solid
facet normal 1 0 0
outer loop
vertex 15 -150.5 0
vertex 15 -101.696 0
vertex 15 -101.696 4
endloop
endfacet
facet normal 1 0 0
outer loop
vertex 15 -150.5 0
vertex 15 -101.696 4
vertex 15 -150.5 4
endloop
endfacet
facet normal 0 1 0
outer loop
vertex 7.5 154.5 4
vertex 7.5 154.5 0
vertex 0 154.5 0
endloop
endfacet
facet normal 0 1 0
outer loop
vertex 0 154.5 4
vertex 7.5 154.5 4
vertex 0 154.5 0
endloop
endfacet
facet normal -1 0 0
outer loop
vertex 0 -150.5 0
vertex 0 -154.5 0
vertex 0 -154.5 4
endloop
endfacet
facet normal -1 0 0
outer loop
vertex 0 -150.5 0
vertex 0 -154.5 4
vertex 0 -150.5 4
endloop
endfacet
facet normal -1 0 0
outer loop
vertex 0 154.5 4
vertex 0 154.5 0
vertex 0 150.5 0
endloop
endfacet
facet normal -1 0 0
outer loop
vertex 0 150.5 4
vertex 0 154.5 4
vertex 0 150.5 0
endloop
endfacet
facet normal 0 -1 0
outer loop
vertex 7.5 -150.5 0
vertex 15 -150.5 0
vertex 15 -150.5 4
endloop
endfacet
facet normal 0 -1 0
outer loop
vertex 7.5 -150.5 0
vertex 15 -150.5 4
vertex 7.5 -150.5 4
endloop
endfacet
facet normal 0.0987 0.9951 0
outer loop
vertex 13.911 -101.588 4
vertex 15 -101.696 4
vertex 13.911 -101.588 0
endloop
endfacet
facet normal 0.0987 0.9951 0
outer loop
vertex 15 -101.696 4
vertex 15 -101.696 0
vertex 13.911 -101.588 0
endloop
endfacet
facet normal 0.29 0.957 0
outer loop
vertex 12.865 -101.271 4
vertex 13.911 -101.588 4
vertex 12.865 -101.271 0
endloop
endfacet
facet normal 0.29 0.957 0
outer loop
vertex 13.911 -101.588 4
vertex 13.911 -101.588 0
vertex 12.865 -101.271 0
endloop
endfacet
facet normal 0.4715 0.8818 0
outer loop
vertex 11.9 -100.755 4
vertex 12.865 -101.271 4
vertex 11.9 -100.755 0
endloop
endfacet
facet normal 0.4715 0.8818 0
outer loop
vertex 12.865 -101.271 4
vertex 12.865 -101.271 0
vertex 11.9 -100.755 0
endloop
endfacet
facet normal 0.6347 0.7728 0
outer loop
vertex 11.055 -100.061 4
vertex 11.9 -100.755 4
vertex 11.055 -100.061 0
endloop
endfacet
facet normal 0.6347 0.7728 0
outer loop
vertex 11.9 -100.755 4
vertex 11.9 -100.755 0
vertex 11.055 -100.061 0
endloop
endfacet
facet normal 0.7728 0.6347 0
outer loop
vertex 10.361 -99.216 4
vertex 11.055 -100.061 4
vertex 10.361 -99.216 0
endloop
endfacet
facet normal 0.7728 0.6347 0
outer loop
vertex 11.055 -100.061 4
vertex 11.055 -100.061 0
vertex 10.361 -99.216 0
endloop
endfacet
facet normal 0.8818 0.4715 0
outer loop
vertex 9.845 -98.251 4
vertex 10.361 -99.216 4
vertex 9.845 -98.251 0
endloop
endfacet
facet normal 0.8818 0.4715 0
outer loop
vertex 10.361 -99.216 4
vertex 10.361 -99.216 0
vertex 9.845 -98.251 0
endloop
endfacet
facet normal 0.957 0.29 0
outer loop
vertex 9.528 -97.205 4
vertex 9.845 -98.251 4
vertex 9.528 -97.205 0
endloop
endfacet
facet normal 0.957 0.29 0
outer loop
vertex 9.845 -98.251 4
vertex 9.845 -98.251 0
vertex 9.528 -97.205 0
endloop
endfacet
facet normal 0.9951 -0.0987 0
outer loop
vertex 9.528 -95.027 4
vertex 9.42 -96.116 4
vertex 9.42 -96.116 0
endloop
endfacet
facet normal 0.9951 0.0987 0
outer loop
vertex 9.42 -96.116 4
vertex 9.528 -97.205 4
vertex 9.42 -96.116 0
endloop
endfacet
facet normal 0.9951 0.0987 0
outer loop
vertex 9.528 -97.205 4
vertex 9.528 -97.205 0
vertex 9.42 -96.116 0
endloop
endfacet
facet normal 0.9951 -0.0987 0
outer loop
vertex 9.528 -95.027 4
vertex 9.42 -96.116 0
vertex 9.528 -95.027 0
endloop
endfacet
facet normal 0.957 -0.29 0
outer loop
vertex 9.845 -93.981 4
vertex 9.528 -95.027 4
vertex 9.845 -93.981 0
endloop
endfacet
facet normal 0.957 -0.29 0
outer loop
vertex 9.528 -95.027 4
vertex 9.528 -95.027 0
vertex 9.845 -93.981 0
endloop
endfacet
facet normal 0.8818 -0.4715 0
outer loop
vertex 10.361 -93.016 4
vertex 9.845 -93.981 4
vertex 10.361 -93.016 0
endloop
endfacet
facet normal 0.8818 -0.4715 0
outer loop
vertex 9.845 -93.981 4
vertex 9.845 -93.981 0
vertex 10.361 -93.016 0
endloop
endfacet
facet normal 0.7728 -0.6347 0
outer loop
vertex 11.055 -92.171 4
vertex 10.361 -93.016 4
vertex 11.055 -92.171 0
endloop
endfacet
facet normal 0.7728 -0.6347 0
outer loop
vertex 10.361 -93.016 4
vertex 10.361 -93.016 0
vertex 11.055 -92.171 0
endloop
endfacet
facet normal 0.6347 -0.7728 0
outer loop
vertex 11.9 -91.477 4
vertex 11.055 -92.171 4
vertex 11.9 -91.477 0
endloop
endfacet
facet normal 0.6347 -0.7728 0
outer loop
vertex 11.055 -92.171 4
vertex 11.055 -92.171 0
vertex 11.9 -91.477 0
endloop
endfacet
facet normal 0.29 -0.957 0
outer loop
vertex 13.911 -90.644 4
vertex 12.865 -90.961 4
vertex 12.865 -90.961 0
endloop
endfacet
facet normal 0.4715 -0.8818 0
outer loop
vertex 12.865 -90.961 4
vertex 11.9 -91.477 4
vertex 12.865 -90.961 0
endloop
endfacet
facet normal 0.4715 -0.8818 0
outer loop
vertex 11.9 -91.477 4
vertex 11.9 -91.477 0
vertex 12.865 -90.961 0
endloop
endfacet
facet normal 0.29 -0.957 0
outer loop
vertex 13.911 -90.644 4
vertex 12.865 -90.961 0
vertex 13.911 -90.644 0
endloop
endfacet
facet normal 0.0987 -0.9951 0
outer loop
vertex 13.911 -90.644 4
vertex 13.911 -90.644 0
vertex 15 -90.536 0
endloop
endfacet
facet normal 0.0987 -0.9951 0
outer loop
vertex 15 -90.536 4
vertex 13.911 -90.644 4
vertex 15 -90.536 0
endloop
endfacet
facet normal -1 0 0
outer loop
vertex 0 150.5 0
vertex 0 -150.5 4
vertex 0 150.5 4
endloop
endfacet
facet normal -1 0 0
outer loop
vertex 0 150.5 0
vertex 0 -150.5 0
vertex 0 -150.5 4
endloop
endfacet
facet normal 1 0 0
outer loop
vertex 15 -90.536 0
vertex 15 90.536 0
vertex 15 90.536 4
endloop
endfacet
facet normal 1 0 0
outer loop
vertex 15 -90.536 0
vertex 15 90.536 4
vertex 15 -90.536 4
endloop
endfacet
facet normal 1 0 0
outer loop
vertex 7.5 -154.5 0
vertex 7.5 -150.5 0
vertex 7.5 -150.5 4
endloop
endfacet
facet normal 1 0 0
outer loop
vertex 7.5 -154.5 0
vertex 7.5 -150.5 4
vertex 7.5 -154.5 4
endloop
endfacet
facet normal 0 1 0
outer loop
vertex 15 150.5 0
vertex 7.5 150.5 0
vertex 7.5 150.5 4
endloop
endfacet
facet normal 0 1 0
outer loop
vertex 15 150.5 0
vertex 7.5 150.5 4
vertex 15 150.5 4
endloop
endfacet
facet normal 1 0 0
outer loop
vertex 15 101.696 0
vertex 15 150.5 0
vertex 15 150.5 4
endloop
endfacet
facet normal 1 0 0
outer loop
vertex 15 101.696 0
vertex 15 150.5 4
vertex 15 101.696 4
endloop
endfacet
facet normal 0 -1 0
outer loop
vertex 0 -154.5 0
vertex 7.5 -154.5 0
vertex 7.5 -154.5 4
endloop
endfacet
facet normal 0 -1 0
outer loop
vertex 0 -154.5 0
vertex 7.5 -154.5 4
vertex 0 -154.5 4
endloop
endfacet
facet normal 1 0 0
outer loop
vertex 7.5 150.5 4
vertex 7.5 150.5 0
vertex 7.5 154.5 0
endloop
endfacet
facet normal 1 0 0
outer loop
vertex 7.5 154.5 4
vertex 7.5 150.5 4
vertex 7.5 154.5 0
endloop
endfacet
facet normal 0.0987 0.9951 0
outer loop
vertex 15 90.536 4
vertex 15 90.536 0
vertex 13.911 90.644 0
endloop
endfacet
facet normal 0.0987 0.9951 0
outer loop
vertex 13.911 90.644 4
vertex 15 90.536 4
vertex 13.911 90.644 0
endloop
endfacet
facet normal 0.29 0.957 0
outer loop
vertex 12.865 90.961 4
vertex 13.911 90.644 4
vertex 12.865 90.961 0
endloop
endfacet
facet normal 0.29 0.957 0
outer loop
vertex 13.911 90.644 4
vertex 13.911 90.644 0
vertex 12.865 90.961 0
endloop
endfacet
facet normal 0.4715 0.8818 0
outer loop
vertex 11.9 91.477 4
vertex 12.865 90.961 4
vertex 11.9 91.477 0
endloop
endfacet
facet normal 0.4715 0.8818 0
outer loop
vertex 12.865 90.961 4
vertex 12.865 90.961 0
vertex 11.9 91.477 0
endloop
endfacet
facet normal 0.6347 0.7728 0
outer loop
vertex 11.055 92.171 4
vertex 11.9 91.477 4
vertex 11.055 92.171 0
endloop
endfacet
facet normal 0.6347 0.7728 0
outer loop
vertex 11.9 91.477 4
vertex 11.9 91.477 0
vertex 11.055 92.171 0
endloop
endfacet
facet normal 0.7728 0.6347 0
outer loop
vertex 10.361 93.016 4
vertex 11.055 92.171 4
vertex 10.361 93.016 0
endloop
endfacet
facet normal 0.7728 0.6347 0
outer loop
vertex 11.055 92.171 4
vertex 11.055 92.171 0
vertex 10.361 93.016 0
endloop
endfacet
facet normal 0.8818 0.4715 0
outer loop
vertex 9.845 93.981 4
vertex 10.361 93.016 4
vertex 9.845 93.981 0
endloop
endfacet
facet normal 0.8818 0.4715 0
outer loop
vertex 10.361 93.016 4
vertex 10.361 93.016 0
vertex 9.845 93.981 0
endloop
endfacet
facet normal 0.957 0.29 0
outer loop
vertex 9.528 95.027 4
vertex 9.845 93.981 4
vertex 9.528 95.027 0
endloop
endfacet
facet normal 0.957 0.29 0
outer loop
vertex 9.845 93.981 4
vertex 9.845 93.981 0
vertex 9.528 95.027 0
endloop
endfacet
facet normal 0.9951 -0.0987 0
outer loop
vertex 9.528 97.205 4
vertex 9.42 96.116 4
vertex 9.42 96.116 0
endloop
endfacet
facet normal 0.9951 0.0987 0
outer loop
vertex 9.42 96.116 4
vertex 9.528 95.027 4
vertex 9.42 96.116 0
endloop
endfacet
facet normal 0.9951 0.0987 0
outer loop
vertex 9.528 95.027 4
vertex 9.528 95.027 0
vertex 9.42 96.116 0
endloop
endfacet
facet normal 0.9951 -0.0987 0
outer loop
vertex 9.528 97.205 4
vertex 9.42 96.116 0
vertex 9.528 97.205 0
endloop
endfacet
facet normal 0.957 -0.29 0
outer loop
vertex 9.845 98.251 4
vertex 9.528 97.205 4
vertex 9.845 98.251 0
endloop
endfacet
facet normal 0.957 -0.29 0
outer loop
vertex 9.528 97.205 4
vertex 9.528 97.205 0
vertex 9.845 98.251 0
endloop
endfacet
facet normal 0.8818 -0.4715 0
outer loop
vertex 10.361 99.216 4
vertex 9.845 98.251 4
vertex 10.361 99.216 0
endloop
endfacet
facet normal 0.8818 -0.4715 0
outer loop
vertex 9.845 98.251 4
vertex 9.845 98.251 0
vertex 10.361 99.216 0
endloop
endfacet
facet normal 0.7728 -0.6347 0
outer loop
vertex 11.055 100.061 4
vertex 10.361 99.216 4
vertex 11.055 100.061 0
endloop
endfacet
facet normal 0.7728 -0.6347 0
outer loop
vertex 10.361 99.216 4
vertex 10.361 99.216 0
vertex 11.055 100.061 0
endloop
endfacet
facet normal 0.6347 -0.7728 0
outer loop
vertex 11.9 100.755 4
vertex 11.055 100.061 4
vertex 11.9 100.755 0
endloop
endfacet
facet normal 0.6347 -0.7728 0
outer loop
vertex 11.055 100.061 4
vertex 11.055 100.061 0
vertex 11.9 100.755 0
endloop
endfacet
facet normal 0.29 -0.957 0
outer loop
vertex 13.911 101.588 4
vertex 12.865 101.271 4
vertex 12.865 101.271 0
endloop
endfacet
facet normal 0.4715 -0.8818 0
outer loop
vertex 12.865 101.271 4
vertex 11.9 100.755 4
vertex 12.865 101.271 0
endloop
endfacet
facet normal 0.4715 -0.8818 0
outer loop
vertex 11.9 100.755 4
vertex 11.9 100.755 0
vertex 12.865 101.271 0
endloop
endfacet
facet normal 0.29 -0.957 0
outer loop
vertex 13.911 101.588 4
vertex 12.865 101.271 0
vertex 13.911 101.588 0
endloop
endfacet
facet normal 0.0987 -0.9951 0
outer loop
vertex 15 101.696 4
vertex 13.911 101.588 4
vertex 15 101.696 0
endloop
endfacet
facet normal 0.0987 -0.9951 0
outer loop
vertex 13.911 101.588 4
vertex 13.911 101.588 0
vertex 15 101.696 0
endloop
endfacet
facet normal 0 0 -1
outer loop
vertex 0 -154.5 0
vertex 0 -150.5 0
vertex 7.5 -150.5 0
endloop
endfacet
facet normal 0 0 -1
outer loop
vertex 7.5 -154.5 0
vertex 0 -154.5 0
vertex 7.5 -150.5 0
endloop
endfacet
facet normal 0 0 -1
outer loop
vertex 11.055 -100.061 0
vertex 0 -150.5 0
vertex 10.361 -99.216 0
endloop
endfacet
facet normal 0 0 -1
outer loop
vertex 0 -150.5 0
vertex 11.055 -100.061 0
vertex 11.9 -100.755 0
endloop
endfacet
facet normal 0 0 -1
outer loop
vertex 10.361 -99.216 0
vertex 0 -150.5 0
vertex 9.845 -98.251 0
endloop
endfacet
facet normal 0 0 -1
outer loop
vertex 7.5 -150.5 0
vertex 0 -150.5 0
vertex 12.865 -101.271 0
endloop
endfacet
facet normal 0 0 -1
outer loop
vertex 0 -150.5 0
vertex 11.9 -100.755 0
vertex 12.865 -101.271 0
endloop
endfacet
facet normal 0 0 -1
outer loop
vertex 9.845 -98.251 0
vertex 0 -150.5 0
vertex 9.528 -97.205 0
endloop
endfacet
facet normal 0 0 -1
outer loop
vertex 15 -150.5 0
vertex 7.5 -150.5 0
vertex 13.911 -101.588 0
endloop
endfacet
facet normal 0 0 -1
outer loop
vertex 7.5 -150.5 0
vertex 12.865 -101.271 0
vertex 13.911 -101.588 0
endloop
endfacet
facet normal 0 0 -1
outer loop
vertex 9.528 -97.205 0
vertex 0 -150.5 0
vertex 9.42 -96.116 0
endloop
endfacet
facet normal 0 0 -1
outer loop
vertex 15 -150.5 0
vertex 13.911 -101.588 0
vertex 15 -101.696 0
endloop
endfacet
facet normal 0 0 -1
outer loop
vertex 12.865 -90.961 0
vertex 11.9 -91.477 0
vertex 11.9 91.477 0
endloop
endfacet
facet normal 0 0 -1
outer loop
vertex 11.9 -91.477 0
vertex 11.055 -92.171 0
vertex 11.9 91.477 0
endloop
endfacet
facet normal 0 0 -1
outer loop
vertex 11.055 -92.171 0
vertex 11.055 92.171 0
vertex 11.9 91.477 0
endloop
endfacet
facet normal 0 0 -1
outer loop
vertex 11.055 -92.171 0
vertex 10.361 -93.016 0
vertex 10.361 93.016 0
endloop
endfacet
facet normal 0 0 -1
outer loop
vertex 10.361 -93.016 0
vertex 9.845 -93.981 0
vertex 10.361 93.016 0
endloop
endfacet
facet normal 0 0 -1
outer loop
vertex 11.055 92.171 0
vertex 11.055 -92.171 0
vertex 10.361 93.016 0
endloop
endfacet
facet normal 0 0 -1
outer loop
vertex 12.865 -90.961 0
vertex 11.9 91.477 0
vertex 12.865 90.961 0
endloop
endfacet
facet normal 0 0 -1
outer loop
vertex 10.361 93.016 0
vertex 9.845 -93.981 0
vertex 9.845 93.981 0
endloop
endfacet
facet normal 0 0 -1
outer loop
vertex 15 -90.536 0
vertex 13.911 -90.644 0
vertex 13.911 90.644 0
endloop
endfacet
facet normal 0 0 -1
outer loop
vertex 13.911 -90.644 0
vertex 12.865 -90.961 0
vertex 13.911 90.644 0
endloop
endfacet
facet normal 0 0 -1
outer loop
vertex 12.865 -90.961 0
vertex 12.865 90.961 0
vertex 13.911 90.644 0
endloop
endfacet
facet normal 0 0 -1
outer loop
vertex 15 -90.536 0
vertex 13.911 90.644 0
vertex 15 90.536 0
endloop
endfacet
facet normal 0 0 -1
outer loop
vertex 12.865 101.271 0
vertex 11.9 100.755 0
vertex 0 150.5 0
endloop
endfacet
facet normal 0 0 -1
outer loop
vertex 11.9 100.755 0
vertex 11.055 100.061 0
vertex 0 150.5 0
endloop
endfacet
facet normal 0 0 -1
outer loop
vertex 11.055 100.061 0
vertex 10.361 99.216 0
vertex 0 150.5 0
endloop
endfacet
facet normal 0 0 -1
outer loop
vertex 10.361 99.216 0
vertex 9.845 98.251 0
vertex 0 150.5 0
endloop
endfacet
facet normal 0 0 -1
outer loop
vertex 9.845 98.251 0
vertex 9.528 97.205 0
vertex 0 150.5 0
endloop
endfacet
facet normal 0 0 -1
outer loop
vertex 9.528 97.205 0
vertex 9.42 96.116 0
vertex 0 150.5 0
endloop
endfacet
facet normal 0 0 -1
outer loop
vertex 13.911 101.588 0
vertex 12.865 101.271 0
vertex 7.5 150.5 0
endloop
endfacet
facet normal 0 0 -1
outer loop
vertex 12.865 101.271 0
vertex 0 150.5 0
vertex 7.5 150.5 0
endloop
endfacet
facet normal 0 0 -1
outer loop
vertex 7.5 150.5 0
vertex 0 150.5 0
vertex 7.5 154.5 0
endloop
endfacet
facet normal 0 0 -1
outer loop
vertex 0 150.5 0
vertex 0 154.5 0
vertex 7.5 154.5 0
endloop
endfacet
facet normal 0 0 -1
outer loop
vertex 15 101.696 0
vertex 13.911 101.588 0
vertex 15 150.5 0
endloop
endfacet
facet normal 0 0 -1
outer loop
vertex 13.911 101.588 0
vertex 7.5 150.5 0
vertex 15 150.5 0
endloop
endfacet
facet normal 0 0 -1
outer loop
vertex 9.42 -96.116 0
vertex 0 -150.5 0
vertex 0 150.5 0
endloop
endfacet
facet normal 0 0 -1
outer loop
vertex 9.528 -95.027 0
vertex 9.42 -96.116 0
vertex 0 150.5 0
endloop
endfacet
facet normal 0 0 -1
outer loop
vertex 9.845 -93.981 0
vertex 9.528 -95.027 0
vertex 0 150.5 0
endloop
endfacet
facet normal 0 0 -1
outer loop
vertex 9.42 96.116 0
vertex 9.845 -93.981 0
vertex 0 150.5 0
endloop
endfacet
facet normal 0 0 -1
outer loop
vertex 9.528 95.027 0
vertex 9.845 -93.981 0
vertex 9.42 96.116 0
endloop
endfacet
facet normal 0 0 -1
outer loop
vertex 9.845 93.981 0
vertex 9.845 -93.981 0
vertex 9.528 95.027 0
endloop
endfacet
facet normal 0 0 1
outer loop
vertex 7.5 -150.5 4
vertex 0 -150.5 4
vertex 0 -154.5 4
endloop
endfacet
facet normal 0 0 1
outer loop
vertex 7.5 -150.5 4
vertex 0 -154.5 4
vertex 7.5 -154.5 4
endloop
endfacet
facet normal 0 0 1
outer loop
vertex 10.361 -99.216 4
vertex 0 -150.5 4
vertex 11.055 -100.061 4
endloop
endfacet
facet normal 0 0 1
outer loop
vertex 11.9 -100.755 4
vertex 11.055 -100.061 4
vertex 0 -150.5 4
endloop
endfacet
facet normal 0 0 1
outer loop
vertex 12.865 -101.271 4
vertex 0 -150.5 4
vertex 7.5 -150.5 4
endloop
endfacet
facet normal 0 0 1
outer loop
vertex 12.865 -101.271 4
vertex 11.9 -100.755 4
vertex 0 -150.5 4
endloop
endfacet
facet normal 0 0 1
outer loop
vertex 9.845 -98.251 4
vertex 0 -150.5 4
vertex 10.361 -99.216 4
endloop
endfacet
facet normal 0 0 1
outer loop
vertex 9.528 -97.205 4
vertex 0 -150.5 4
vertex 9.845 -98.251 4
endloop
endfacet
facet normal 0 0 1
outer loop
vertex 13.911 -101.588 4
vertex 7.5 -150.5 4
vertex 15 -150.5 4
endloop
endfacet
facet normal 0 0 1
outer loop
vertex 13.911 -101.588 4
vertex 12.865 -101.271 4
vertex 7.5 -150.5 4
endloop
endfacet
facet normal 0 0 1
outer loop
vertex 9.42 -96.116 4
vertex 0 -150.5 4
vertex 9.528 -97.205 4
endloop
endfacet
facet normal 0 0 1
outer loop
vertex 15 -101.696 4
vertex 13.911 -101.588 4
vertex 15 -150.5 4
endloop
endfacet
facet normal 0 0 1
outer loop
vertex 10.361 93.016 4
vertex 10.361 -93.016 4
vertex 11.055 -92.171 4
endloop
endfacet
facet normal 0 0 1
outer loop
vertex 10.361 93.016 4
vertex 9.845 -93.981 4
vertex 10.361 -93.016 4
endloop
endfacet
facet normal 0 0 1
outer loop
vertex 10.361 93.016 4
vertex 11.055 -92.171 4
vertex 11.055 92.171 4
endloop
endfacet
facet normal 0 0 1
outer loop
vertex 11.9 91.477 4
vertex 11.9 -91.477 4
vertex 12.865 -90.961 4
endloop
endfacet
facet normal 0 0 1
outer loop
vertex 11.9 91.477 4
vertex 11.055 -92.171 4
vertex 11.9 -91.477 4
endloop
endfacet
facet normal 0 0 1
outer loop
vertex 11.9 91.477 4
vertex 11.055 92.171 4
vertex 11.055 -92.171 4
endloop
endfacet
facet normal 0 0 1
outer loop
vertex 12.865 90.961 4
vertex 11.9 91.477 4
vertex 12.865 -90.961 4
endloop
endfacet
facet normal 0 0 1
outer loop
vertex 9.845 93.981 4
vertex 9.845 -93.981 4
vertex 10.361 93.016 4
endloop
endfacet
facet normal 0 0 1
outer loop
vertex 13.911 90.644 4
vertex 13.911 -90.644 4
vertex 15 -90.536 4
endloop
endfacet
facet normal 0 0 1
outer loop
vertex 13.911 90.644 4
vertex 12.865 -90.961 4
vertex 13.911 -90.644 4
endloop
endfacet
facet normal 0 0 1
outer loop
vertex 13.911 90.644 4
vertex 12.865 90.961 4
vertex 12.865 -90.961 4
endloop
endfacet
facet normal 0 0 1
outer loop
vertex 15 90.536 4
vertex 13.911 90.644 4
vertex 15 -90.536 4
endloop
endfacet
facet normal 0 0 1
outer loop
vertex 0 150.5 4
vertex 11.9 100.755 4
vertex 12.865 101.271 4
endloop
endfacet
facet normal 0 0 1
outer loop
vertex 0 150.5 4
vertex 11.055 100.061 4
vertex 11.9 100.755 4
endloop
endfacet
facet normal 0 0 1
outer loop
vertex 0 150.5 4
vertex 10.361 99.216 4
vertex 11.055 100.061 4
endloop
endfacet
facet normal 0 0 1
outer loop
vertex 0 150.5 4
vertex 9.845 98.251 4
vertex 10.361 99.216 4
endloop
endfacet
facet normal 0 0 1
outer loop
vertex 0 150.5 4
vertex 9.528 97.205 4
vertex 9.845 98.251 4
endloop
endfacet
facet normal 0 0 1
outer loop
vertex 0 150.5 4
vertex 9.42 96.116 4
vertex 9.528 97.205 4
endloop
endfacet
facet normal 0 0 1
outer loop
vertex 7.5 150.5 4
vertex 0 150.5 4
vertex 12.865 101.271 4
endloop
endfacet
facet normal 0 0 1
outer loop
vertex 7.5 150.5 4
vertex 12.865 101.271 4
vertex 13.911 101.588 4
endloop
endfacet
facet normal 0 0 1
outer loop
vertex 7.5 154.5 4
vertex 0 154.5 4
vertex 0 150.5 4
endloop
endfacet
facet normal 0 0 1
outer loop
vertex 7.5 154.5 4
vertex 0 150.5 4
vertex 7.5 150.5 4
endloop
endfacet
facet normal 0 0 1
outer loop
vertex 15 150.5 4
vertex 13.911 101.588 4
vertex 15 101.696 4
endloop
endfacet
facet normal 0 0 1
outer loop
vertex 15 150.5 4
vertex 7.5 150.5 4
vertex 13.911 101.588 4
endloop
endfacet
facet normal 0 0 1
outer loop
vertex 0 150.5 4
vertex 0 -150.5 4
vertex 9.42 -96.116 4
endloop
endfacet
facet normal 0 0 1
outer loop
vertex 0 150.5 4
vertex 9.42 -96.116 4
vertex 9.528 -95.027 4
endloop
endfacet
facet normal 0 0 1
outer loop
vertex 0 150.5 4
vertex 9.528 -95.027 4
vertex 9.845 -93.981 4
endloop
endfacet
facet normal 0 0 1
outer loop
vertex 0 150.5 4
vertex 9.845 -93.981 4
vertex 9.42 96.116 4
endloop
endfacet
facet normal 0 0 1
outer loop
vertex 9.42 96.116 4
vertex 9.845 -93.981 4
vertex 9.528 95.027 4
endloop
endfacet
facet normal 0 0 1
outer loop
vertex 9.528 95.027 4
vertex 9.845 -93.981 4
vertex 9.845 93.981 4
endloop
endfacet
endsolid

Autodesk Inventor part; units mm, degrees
ref_plane "YZ Plane" through (0, 0, 0) normal (1, 0, 0) x (0, 1, 0)
ref_plane "XZ Plane" through (0, 0, 0) normal (0, 1, 0) x (-1, 0, 0)
ref_plane "XY Plane" through (0, 0, 0) normal (0, 0, 1) x (1, 0, 0)
sketch "Sketch1" plane through (0, 0, 0) normal (0, 0, 1) x (1, 0, 0)
  line L0 (0, 150.5) -> (7.5, 150.5) construction
  line L1 (15, 150.5) -> (15, -150.5)
  line L2 (15, -150.5) -> (7.5, -150.5)
  line L3 (0, -150.5) -> (0, 150.5)
  line L4 (0, 150.5) -> (7.5, 150.5) construction
  line L5 (7.5, 150.5) -> (7.5, 154.5)
  line L6 (7.5, 154.5) -> (0, 154.5)
  line L7 (0, 154.5) -> (0, 150.5)
  line L8 (0, -150.5) -> (7.5, -150.5) construction
  line L9 (7.5, -150.5) -> (7.5, -154.5)
  line L10 (7.5, -154.5) -> (0, -154.5)
  line L11 (0, -154.5) -> (0, -150.5)
  line L12 (7.5, -150.5) -> (0, -150.5) construction
  line L13 (7.5, 150.5) -> (15, 150.5)
  circle A0 centre (15, 96.116) radius 5.5796
  circle A1 centre (15, -96.116) radius 5.5796
  line L14 (-4.1159, 0) -> (24.6955, 0) construction
  point P0 (0, 0)
  point P1 (0, 0)
  point P2 (3.75, 150.5)
  point P3 (0, 0)
  point P4 (15, -101.6955)
  point P5 (15, -90.5364)
  point P6 (15, 90.5364)
  point P7 (15, 101.6955)
  dimension "d0" = 301
  dimension "d1" = 15
  dimension "d2" = 4
  dimension "d3" = 7.5
  dimension "d4" = 4
  dimension "d5" = 7.5
  dimension "d6" = 150.5
extrude "Extrusion1" add sketch "Sketch1" along normal blind 4 contours L1 A0 A1 L2 L9 L10 L11 L3 L7 L6 L5 L13
properties part number "ReedRail" material "Wood (Oak)"
